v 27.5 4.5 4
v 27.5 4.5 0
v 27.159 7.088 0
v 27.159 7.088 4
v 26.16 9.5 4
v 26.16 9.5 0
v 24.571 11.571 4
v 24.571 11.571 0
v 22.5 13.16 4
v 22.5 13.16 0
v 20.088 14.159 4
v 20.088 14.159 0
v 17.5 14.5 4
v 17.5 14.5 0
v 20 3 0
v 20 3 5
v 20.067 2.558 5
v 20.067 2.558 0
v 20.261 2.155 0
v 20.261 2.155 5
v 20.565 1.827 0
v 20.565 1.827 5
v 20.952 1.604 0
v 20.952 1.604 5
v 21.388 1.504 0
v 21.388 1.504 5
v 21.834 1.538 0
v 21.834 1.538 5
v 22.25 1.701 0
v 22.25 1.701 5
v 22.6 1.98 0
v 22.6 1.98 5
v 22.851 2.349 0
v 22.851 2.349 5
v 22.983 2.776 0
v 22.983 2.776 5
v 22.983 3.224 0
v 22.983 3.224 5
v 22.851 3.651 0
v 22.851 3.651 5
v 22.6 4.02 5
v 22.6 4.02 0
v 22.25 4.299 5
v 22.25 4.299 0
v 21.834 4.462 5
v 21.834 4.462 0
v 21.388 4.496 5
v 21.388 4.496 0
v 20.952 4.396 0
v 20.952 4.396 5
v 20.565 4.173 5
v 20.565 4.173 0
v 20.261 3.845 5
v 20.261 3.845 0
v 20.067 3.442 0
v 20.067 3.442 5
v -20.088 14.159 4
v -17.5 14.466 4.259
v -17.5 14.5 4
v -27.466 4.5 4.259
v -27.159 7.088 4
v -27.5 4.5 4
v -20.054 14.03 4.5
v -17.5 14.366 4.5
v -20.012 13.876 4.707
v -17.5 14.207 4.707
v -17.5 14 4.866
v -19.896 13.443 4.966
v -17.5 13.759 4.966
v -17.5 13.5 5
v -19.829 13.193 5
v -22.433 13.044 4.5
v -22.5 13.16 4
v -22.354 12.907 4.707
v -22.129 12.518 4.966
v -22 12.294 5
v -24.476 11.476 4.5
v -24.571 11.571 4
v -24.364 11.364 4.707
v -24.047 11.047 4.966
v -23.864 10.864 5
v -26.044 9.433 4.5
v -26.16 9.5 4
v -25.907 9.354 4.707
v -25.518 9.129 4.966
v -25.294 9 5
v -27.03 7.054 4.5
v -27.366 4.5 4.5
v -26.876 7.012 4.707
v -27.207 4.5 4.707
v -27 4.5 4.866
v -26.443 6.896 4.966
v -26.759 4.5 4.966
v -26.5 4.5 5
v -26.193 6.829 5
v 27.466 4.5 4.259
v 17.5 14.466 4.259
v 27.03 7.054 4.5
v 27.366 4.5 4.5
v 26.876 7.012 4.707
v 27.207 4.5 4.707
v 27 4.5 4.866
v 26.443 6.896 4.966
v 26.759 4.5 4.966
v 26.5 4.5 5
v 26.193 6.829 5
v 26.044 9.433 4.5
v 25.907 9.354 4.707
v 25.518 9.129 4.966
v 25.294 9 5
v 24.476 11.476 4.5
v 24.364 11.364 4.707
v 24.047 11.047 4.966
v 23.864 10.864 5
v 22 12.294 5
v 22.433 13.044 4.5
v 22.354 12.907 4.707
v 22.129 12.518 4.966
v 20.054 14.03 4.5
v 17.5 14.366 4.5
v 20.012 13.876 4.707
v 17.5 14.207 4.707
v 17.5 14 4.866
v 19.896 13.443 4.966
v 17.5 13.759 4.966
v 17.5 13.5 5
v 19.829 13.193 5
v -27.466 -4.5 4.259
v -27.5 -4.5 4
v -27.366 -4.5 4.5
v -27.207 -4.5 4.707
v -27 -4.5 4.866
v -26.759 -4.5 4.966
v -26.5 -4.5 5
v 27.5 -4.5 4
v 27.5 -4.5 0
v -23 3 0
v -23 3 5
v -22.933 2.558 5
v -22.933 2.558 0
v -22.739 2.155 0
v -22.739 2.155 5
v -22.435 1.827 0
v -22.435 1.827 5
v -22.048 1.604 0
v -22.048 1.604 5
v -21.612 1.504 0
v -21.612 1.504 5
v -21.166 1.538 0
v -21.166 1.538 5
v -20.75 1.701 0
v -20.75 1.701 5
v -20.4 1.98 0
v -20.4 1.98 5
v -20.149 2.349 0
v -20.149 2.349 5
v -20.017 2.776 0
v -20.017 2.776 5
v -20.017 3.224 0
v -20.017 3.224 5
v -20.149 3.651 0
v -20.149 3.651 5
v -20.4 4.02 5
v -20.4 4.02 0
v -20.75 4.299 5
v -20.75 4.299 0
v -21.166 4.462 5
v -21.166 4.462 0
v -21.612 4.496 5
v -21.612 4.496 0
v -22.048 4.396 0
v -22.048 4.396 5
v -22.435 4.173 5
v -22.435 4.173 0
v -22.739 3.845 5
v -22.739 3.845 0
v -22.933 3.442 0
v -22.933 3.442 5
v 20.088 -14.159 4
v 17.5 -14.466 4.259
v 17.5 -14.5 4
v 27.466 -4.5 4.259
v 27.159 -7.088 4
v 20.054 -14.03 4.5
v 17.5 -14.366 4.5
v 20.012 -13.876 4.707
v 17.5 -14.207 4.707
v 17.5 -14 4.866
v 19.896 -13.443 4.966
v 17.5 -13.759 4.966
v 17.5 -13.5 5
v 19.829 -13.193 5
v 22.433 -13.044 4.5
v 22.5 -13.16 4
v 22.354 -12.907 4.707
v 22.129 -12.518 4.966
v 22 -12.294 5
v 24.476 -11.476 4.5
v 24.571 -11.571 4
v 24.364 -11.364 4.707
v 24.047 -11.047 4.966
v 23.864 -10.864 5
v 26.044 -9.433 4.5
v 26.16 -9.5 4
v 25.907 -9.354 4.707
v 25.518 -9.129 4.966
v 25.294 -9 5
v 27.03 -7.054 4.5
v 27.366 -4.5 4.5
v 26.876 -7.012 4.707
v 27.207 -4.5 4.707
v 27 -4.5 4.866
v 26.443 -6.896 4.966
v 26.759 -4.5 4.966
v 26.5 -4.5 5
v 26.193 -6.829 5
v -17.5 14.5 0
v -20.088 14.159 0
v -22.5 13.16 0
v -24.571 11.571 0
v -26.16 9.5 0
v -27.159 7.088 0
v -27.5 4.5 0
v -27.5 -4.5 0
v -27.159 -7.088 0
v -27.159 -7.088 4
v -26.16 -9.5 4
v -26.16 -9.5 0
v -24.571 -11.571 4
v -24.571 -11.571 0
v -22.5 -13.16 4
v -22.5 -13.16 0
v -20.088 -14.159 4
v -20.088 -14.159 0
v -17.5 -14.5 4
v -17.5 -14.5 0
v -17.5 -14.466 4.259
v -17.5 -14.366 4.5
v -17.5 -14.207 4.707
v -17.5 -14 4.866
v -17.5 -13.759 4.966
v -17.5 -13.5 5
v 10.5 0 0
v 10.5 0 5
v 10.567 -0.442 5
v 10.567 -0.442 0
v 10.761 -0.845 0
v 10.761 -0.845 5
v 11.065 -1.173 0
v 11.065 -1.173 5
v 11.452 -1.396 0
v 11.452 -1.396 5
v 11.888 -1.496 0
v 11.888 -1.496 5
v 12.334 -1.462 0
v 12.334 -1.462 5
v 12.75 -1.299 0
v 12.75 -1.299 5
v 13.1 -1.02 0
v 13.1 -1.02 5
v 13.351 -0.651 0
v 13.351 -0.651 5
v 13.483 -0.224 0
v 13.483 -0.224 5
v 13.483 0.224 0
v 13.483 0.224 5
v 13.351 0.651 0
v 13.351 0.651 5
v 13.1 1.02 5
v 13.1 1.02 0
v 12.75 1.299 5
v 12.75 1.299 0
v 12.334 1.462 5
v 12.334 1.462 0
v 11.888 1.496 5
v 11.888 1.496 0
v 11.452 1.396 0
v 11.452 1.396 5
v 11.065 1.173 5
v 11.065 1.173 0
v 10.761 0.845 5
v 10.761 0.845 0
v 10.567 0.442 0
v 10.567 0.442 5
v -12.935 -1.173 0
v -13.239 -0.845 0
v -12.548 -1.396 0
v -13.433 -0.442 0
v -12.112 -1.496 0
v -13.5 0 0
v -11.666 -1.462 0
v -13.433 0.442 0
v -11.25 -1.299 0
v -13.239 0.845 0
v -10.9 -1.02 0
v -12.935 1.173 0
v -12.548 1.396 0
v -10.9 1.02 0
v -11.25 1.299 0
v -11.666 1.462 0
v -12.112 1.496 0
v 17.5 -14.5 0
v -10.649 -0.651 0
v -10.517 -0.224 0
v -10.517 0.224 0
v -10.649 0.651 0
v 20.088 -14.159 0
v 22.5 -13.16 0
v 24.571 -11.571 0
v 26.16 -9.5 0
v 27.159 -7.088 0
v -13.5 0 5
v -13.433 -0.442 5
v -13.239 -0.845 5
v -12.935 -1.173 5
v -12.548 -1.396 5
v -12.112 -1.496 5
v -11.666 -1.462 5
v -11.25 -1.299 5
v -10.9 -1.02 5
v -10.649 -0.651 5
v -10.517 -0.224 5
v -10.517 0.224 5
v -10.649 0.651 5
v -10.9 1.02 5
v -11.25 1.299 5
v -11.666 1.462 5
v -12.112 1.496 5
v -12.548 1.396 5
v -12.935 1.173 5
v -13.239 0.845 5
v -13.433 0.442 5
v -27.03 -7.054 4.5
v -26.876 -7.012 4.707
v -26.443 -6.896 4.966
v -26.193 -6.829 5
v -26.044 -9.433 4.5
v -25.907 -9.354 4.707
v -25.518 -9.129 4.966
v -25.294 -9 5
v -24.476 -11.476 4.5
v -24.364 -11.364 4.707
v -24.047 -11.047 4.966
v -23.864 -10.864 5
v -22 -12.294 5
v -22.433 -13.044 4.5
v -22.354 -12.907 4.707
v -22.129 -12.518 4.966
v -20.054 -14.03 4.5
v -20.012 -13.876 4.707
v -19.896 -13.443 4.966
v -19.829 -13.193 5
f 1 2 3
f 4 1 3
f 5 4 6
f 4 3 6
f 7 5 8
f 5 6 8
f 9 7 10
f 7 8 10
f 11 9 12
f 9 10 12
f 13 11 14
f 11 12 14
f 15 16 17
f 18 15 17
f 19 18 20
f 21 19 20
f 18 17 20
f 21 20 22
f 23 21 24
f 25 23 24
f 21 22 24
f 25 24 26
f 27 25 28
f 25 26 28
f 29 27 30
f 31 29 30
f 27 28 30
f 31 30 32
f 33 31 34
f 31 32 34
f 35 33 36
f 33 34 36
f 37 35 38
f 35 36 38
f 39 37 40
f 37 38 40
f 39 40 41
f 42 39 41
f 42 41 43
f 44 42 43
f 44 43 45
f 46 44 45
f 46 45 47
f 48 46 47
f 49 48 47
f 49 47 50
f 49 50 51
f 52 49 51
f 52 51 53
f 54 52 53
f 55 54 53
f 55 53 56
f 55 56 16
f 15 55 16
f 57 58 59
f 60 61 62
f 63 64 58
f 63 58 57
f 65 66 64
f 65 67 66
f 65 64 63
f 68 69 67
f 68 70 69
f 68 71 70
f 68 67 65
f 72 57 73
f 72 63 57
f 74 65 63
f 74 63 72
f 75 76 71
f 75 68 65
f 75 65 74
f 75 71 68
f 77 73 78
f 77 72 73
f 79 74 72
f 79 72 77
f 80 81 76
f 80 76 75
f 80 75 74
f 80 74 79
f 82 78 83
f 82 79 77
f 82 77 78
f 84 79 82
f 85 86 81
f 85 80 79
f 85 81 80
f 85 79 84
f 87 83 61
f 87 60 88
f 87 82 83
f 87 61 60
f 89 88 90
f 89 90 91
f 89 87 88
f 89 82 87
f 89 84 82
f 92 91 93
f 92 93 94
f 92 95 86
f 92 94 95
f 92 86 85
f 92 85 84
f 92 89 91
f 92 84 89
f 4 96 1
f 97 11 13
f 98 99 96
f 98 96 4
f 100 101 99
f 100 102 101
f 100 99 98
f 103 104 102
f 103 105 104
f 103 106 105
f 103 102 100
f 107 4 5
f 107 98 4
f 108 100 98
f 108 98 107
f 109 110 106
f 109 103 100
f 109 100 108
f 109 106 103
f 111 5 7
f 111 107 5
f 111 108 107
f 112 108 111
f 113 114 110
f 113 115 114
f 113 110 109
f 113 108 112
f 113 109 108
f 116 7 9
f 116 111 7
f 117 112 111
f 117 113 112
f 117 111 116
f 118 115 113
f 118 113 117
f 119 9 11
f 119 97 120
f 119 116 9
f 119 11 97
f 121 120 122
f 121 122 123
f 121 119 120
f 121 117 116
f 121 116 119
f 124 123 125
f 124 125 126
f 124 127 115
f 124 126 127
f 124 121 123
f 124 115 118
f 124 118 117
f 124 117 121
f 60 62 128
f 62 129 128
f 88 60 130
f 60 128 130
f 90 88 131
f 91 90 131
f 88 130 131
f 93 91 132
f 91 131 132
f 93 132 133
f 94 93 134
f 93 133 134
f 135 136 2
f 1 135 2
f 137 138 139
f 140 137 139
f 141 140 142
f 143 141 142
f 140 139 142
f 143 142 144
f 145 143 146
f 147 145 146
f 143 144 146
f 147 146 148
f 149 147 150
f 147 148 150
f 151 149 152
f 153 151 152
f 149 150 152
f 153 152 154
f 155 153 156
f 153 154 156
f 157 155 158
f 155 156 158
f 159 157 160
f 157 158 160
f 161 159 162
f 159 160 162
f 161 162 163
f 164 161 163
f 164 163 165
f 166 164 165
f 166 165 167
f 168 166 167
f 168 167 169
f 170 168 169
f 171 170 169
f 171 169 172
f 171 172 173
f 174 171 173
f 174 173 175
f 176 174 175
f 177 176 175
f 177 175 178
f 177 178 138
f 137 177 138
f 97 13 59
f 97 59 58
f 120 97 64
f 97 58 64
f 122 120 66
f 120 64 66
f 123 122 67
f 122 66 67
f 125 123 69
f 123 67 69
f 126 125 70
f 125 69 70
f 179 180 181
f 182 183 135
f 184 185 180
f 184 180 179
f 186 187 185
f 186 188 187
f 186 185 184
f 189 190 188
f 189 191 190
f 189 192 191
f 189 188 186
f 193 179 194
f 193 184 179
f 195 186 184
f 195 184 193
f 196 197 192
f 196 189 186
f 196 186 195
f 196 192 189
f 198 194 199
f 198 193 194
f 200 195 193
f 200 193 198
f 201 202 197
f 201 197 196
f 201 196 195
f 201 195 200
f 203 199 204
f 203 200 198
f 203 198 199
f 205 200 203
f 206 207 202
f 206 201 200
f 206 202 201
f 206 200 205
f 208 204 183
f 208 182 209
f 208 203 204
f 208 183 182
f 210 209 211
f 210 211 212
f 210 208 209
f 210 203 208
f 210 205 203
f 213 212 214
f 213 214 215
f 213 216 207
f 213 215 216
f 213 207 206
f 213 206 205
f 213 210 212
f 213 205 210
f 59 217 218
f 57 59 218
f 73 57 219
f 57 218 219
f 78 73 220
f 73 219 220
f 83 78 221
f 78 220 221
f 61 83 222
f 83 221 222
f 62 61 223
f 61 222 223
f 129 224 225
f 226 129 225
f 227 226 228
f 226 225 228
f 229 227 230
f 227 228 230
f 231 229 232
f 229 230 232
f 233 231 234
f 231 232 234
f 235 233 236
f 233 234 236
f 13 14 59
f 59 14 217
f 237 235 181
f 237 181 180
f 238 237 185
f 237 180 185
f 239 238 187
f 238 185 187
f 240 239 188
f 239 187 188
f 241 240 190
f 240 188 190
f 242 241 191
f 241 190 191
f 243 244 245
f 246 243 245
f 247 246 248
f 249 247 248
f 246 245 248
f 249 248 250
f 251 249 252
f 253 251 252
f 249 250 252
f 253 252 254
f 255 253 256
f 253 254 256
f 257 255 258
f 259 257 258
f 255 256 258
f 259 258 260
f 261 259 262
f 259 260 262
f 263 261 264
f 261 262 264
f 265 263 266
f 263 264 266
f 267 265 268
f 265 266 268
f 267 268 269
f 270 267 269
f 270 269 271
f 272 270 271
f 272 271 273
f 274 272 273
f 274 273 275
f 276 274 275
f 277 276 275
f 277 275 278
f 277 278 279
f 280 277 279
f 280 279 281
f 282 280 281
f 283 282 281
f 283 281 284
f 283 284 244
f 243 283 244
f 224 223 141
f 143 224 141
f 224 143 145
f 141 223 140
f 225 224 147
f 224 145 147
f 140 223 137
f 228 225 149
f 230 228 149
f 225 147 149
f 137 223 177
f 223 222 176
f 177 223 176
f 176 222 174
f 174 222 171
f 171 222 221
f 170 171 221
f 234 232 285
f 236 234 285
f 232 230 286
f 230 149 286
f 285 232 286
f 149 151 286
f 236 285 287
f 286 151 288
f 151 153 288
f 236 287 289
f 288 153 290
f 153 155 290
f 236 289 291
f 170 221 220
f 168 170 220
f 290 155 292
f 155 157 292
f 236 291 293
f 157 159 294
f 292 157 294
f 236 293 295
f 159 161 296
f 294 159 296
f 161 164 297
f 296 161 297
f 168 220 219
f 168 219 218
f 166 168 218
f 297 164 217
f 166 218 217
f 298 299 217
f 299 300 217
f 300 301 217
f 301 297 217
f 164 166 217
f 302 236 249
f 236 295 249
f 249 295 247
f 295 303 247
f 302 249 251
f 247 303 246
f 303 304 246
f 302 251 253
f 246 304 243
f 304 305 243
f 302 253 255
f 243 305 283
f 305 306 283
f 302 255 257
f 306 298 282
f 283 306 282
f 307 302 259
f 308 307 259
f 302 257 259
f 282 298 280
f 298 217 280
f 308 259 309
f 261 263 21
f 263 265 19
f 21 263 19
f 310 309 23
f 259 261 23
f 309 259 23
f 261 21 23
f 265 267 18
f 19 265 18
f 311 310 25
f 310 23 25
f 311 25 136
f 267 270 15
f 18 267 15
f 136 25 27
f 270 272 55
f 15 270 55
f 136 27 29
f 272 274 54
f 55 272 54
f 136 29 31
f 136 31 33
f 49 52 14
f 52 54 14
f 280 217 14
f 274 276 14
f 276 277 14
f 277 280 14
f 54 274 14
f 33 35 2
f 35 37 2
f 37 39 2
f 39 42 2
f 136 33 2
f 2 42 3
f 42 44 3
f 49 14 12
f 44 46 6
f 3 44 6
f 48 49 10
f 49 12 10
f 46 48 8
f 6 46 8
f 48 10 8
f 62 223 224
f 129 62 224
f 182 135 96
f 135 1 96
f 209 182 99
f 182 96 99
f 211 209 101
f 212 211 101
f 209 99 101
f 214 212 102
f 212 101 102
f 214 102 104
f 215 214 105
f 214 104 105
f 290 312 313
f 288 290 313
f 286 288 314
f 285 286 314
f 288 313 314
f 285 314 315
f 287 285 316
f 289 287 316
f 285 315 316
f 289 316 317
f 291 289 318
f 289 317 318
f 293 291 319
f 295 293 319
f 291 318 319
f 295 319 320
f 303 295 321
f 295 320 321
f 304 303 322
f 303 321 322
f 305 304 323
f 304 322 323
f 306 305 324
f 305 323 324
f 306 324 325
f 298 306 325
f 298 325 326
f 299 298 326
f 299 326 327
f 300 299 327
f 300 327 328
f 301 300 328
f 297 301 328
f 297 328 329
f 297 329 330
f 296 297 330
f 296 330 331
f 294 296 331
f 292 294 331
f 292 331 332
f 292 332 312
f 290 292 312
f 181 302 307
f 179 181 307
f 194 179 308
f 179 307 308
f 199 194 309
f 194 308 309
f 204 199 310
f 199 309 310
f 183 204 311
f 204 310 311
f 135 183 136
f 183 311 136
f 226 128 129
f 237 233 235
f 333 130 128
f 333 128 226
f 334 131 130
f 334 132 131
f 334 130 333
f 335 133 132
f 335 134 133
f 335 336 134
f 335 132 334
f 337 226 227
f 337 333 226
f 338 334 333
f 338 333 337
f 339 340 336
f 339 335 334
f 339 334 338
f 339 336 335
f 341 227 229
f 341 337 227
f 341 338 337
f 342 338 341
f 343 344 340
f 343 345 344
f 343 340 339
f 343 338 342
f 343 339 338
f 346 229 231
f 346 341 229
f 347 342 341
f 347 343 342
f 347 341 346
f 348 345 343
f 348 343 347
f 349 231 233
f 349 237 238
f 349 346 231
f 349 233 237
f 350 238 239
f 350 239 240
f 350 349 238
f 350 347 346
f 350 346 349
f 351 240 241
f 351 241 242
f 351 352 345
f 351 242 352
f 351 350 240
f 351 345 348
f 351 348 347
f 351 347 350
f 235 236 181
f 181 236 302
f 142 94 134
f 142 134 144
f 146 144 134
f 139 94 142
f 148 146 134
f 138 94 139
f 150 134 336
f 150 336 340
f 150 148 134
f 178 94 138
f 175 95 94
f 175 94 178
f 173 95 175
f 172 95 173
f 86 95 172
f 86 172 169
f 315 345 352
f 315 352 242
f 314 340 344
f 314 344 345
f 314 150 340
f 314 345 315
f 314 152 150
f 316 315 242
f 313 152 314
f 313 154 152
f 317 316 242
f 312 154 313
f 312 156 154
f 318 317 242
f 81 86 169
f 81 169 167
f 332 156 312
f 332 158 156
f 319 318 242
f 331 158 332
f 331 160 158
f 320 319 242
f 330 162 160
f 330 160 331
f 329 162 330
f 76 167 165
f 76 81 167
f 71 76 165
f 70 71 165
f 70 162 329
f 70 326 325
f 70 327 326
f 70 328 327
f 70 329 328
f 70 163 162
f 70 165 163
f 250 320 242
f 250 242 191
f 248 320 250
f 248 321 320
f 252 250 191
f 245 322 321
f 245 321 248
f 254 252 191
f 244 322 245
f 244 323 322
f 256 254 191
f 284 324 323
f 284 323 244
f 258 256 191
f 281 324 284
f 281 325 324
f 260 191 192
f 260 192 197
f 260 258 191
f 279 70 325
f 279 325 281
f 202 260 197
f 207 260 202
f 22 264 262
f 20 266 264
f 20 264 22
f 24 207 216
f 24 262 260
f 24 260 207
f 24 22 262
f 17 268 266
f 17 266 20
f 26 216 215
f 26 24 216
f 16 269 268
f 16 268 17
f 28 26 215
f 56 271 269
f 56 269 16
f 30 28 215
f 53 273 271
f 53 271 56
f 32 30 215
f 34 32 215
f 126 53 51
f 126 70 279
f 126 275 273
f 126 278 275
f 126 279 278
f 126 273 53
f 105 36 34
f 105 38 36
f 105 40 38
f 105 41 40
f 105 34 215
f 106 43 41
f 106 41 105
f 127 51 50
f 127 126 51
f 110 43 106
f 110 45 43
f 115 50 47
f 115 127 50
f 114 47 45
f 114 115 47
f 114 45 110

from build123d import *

# Parameters (mm, degrees)
F1_DEPTH = 5
F2_R     = 1
F3_D     = 3
F4_D     = 3


with BuildPart() as f1:
    # F0 (on Top) → F1 (new body)
    with BuildSketch(Plane.XY):
        with BuildLine():
            Line((17.5, 14.5), (-17.5, 14.5))
            ThreePointArc((-17.5, 14.5), (-24.5710678119, 11.5710678119), (-27.5, 4.5))
            Line((-27.5, 4.5), (-27.5, -4.5))
            ThreePointArc((-27.5, -4.5), (-24.5710678119, -11.5710678119), (-17.5, -14.5))
            Line((-17.5, -14.5), (17.5, -14.5))
            ThreePointArc((17.5, -14.5), (24.5710678119, -11.5710678119), (27.5, -4.5))
            Line((27.5, -4.5), (27.5, 4.5))
            ThreePointArc((27.5, 4.5), (24.5710678119, 11.5710678119), (17.5, 14.5))
        make_face()
    extrude(amount=F1_DEPTH)

    # F2
    f2_edges = [f1.edges().sort_by_distance(p)[0] for p in [
        (0, 14.5, 5),
        (-24.571068, 11.571068, 5),
        (-27.5, 0, 5),
        (-24.571068, -11.571068, 5),
        (0, -14.5, 5),
        (24.571068, -11.571068, 5),
        (27.5, 0, 5),
        (24.571068, 11.571068, 5),
    ]]
    fillet(f2_edges, radius=F2_R)

    # F3 (through all)
    with Locations(Plane(origin=(0, 0, 0), x_dir=(1, 0, 0), z_dir=(0, 0, -1))):
        with Locations((-21.5, -3), (21.5, -3)):
            Hole(F3_D / 2)

    # F4 (through all)
    with Locations(Plane(origin=(0, 0, 0), x_dir=(1, 0, 0), z_dir=(0, 0, -1))):
        with Locations((-12, 0), (12, 0)):
            Hole(F4_D / 2)


solid = f1.part
